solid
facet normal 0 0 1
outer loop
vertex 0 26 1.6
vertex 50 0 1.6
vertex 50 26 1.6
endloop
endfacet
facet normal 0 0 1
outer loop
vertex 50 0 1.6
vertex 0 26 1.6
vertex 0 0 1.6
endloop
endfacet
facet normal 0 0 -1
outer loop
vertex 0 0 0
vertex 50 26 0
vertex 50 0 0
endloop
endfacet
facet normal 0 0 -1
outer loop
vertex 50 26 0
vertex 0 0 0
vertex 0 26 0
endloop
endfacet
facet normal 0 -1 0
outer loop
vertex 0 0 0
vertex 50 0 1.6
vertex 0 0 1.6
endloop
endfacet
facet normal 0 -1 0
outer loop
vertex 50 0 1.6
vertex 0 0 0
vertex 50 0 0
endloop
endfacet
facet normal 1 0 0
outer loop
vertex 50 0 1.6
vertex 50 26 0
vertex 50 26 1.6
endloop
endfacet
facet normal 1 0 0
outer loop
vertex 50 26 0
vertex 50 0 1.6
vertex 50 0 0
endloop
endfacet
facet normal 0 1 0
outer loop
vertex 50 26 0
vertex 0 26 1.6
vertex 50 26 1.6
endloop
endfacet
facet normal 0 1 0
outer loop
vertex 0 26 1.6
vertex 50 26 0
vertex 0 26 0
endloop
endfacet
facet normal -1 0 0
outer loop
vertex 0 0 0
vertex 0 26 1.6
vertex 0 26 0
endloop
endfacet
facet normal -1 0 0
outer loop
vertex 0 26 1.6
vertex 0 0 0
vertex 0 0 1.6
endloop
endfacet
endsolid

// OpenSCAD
$fn = 64;

length = 50.0;
width  = 26.0;
thick  = 1.6;

color([0.05, 0.45, 0.15])
cube([length, width, thick], center=false);
